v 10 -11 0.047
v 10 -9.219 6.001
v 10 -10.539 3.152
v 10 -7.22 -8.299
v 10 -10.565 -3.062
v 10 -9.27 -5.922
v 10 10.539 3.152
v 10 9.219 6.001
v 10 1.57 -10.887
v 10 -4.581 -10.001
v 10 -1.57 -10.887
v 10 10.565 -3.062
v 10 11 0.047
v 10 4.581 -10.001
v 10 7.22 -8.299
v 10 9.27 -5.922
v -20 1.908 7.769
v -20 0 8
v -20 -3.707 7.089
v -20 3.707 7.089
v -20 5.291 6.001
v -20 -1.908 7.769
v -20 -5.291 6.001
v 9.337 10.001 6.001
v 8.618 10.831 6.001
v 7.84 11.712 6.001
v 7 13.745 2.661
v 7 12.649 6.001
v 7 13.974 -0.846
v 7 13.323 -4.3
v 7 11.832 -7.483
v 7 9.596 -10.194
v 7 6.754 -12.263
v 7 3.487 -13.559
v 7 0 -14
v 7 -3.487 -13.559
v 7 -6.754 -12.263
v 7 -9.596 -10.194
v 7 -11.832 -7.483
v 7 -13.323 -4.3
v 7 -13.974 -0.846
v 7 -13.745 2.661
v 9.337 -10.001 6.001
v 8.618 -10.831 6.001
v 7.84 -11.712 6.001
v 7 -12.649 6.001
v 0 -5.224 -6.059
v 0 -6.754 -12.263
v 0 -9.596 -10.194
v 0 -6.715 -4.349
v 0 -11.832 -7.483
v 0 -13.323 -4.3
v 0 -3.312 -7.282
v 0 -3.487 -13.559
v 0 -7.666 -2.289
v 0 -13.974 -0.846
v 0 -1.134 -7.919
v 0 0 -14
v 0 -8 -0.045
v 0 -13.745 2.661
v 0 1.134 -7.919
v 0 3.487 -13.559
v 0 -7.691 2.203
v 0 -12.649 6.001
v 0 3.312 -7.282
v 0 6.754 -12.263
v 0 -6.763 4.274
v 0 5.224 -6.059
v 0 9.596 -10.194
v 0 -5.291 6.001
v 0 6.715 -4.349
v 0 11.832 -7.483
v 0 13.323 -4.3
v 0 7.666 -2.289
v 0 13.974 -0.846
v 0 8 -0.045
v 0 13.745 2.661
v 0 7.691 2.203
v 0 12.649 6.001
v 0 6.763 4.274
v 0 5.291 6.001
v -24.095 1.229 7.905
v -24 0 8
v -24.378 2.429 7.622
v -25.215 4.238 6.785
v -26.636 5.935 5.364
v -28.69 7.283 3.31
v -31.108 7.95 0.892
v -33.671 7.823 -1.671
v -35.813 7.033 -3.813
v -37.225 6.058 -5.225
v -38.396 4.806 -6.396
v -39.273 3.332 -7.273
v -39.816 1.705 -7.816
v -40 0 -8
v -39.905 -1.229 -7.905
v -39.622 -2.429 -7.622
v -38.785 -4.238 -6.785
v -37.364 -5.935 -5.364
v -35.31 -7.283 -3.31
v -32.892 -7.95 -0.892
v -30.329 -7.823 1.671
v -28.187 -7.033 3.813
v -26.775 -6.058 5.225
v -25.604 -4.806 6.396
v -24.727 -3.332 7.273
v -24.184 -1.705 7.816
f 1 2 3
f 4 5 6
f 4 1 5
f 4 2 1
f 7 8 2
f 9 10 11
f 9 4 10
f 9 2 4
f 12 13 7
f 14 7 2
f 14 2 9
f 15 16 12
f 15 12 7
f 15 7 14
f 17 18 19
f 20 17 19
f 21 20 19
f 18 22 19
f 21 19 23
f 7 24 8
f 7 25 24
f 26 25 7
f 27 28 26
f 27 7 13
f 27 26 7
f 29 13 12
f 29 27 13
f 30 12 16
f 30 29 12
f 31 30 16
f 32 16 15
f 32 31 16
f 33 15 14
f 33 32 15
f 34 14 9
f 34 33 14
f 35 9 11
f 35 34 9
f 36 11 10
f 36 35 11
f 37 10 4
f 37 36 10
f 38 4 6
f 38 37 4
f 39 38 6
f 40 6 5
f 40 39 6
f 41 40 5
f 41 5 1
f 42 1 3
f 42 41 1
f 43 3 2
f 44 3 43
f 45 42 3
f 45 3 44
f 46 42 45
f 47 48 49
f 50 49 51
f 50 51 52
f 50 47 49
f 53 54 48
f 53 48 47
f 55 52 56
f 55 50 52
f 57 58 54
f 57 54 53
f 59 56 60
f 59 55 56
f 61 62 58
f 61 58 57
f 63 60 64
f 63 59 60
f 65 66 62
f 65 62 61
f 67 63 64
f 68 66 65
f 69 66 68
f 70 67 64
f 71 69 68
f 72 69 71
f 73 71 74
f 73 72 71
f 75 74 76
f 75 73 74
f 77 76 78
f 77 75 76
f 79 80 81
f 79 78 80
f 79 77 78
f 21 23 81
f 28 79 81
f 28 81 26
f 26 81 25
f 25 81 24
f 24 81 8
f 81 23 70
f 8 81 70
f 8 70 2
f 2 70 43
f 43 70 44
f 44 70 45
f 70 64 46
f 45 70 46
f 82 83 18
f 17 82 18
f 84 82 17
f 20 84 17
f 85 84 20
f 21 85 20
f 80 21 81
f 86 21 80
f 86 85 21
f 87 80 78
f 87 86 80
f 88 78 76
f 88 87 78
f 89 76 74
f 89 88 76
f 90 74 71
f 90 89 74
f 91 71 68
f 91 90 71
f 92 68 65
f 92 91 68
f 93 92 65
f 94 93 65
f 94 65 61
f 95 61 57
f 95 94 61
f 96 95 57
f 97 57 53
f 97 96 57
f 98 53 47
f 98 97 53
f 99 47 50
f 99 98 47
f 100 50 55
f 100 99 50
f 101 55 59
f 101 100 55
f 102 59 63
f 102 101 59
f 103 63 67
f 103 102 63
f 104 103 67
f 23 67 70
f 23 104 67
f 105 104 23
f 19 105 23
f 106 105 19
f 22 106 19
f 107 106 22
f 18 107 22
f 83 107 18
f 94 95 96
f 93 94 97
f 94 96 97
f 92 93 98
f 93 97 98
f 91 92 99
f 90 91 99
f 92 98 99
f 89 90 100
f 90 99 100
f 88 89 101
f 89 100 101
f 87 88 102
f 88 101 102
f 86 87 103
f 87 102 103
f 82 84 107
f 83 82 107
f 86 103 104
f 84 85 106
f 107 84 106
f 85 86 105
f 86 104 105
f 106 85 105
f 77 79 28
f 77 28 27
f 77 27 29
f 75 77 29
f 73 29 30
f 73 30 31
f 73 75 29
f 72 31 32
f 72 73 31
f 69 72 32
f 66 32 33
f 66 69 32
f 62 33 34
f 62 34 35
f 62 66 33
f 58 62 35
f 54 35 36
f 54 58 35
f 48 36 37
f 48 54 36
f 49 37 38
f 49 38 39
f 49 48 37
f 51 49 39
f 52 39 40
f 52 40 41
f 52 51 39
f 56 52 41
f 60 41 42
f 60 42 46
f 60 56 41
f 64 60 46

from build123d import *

# Parameters (mm, degrees)
F2_SIZE  = 3
F3_W     = 30
F3_H     = 8.326223
F3_H_2   = 2
F4_DEPTH = 15
F6_DEPTH = 15


with BuildPart() as f1:
    # F0 (on Front) → F1 (revolve)
    with BuildSketch(Plane.XZ):
        Polygon((-40, 8), (-40, 0), (10, 0), (10, 14), (0, 14), (0, 8), align=None)
    revolve(axis=Axis((-23.084291, 0, 0), (-1, 0, 0)))

    # F2
    f2_edges = [f1.edges().sort_by_distance(p)[0] for p in [
        (10, 0, -14),
    ]]
    chamfer(f2_edges, length=F2_SIZE)

    # F3 (on Front) → F4 (cut, symmetric)
    with BuildSketch(Plane.XZ):
        with Locations((-5, 12.163677)):
            Rectangle(F3_W, F3_H)
        with Locations((-5, 7.000566)):
            Rectangle(F3_W, F3_H_2)
    extrude(amount=F4_DEPTH, both=True, mode=Mode.SUBTRACT)

    # F5 (on Front) → F6 (cut, symmetric)
    with BuildSketch(Plane.XZ):
        Polygon((-24, 8), (-40, 8), (-40, -8), align=None)
    extrude(amount=F6_DEPTH, both=True, mode=Mode.SUBTRACT)


solid = f1.part
